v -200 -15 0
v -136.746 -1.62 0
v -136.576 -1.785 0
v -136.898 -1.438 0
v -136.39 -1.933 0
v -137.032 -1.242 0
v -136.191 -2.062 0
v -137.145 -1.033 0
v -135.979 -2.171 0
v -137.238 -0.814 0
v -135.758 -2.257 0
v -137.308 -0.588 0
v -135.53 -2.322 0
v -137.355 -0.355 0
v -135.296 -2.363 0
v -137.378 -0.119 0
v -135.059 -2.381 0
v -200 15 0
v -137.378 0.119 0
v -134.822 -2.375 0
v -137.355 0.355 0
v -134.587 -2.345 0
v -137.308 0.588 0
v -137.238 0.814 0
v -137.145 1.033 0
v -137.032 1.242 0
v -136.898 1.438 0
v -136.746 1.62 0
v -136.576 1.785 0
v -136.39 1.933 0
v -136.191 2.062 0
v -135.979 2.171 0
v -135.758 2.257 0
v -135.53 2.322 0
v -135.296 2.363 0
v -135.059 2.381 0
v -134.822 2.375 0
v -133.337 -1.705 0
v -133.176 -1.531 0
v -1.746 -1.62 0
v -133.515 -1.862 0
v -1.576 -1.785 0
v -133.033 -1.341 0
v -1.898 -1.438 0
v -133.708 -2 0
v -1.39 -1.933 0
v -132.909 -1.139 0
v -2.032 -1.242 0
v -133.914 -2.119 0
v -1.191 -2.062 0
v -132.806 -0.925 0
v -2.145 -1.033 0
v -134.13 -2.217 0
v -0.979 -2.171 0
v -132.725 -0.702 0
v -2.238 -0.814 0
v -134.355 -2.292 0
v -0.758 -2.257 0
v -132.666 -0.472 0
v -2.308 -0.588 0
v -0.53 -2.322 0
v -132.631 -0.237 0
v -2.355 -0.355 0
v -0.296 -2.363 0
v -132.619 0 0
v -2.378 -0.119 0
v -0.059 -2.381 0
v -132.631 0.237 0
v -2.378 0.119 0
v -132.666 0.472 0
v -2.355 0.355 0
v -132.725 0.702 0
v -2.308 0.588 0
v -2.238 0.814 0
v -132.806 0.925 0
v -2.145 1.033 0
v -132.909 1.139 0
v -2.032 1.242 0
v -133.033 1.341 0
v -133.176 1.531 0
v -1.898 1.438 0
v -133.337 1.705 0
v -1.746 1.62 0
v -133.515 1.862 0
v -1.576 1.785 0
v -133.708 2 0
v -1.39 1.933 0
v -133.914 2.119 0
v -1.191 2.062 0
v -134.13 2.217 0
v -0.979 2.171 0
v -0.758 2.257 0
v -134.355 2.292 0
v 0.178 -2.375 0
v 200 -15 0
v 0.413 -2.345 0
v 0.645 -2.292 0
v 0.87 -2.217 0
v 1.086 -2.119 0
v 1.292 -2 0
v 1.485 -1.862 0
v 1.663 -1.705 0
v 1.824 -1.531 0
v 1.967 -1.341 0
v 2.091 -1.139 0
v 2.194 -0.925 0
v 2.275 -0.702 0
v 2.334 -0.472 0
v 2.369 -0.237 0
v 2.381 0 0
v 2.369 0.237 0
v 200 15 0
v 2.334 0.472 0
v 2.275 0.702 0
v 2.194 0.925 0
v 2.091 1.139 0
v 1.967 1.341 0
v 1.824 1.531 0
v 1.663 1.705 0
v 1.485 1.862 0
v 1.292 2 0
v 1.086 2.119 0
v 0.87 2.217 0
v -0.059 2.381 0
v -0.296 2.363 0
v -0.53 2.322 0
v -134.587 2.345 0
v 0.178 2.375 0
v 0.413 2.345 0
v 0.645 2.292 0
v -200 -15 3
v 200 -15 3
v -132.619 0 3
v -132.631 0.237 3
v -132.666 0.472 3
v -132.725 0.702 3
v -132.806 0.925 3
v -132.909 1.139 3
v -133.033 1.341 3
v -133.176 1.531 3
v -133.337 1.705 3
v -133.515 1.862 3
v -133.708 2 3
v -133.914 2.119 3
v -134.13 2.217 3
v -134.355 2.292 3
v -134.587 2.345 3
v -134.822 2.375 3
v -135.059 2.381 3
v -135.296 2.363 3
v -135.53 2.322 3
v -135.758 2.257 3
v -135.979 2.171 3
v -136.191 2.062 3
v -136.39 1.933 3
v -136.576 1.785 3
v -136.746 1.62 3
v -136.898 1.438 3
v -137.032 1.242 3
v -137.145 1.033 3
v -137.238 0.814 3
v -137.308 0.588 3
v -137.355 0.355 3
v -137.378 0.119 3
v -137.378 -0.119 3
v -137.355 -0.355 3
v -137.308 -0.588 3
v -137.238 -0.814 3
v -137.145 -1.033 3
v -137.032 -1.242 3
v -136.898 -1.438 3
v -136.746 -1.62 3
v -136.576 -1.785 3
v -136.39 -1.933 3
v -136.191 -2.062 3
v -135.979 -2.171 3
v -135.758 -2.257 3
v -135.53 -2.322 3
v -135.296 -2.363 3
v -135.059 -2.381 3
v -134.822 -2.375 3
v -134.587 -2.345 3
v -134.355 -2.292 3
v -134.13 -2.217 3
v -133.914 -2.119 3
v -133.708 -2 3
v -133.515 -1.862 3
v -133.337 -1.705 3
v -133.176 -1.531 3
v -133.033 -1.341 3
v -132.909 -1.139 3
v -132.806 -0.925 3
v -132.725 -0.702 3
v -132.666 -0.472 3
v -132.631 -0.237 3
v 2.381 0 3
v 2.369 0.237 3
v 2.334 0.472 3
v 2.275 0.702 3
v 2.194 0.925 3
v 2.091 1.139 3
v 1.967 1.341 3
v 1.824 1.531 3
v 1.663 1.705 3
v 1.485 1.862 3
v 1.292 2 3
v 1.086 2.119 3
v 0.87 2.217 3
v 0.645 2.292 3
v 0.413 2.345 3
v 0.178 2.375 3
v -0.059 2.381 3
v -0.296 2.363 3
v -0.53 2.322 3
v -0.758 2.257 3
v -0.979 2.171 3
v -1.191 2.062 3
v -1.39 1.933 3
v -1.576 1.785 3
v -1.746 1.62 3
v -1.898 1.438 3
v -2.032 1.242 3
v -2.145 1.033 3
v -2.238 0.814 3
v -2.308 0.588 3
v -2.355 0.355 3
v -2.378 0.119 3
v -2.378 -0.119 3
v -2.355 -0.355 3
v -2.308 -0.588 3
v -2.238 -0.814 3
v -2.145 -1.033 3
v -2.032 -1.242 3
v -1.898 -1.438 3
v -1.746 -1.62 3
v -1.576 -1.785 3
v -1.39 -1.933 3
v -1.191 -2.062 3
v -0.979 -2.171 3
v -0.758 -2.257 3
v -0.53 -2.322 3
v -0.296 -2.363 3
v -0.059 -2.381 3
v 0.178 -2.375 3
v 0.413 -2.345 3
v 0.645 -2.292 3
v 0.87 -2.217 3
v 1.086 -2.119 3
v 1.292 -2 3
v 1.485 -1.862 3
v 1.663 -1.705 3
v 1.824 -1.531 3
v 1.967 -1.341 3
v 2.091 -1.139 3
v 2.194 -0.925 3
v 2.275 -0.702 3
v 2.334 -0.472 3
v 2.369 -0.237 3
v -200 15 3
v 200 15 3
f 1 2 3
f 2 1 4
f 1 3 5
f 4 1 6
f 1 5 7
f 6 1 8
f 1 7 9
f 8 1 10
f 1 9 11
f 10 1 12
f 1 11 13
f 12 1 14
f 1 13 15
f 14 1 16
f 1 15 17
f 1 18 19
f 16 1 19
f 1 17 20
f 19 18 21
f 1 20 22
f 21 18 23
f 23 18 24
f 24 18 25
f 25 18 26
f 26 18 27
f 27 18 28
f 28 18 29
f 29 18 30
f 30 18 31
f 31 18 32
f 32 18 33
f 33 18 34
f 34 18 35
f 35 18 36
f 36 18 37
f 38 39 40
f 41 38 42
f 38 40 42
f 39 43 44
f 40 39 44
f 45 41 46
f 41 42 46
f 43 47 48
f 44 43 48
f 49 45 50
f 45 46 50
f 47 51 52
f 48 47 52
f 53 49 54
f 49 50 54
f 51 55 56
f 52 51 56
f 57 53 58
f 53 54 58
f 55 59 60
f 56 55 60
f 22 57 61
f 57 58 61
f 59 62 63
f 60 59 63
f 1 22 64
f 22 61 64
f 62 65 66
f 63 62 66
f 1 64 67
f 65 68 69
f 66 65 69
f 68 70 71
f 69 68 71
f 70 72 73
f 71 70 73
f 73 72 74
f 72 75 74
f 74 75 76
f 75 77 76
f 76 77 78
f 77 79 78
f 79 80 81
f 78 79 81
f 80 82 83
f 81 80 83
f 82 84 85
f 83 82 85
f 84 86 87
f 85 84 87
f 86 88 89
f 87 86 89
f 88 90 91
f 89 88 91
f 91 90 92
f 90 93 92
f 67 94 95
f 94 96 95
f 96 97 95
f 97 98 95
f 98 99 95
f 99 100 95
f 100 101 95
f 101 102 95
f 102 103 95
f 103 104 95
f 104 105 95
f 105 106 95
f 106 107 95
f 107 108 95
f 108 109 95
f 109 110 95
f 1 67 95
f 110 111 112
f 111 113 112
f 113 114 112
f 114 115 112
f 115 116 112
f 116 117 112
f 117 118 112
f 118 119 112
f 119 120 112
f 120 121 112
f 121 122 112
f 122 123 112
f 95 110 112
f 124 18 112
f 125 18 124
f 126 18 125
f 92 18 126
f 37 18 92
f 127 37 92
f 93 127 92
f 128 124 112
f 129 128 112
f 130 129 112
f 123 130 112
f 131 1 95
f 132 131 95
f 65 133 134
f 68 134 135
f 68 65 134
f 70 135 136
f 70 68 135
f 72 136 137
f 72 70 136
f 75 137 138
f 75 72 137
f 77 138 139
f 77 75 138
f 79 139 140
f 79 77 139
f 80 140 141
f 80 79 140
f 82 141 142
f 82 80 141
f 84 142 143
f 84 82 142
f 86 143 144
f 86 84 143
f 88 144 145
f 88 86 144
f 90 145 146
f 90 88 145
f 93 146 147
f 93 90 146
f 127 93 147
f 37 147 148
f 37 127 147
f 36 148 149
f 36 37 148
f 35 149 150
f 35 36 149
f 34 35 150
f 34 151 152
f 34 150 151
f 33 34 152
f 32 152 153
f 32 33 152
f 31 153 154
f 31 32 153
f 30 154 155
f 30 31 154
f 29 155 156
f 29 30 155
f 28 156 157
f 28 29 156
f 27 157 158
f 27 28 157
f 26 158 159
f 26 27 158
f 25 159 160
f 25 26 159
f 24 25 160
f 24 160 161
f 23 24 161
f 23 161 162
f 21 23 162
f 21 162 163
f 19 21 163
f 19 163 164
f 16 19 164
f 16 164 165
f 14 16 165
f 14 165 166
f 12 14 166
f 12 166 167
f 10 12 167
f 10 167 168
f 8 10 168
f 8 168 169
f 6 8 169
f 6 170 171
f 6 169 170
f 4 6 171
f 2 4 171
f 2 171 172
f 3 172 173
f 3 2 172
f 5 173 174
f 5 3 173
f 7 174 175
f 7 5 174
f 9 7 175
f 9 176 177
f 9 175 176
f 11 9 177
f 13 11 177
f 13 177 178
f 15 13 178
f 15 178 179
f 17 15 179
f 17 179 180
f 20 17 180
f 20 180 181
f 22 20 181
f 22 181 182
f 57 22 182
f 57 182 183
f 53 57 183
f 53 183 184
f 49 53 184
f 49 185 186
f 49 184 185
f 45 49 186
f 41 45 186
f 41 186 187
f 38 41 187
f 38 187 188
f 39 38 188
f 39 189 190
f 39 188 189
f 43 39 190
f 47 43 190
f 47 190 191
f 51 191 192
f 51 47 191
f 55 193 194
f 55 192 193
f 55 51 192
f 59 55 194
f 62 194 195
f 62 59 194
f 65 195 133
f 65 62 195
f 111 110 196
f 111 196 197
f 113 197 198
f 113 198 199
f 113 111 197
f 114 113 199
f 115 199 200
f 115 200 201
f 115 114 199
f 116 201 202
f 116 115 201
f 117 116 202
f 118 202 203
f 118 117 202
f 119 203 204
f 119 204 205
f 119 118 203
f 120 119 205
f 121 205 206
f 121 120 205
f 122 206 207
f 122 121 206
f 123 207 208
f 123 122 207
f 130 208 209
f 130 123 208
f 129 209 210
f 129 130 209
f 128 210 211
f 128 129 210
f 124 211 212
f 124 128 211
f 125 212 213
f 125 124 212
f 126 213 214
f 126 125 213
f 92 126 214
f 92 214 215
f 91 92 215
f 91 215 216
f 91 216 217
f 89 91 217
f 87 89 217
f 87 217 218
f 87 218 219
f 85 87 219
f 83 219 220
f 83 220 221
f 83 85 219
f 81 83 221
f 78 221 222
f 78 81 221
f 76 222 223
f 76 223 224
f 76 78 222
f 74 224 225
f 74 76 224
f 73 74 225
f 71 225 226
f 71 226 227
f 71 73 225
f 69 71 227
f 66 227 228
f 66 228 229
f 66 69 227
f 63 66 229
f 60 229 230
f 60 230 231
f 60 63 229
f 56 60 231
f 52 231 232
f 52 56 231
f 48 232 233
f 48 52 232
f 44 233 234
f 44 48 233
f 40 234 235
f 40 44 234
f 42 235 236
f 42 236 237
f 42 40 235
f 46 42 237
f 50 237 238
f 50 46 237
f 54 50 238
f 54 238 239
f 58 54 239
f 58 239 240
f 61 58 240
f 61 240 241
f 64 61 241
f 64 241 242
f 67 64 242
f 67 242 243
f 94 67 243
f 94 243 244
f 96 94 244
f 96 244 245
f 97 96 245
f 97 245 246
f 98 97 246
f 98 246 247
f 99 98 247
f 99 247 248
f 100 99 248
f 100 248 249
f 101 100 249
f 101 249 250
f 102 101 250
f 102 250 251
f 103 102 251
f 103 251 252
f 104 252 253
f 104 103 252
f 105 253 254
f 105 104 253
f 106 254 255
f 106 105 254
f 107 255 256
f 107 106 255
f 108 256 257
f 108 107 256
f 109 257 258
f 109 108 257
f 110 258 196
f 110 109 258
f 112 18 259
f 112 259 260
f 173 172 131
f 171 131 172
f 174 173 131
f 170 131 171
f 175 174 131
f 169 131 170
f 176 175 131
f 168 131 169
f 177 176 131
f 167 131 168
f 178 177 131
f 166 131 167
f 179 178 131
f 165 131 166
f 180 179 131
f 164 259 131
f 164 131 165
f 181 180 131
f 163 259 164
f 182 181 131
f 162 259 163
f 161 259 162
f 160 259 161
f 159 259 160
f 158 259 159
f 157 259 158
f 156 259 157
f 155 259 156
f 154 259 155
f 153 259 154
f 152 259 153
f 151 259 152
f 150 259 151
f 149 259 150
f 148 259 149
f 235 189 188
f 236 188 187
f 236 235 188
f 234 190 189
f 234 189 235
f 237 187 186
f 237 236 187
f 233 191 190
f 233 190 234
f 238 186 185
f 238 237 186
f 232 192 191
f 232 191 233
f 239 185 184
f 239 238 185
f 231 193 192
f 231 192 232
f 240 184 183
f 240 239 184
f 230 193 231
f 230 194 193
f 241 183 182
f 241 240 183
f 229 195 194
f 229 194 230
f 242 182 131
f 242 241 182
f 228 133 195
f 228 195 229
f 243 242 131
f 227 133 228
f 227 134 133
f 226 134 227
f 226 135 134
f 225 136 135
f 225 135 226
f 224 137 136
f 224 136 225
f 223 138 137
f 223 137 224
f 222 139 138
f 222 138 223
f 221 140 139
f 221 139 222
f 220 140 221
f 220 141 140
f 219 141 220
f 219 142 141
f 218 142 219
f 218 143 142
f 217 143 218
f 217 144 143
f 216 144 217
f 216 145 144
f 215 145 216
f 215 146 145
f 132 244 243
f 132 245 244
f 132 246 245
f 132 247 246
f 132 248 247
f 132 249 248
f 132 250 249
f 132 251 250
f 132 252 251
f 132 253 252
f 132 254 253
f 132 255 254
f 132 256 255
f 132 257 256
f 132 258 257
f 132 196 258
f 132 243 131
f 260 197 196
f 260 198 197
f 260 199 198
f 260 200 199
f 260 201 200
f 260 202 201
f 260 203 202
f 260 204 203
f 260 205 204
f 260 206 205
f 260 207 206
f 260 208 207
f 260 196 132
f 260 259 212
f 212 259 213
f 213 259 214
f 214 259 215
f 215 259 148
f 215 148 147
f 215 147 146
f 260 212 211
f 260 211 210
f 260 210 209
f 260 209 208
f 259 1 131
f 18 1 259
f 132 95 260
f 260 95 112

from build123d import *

# Parameters (mm, degrees)
CROQUIS1_W              = 400
CROQUIS1_H              = 30
CROQUIS1_R              = 2.38125
SALIENTE_EXTRUIR1_DEPTH = 3
CROQUIS2_R              = 2.38125
CORTAR_EXTRUIR2_DEPTH   = 4


with BuildPart() as part:
    # Croquis1 → Saliente-Extruir1 (new body)
    with BuildSketch(Plane.XY):
        Rectangle(CROQUIS1_W, CROQUIS1_H)
        Circle(CROQUIS1_R, mode=Mode.SUBTRACT)
    extrude(amount=SALIENTE_EXTRUIR1_DEPTH)

    # Croquis2 → Cortar-Extruir2 (cut, through all)
    with BuildSketch(Plane.XY):
        with Locations((-135, 0)):
            Circle(CROQUIS2_R)
    extrude(amount=CORTAR_EXTRUIR2_DEPTH, mode=Mode.SUBTRACT)


solid = part.part
